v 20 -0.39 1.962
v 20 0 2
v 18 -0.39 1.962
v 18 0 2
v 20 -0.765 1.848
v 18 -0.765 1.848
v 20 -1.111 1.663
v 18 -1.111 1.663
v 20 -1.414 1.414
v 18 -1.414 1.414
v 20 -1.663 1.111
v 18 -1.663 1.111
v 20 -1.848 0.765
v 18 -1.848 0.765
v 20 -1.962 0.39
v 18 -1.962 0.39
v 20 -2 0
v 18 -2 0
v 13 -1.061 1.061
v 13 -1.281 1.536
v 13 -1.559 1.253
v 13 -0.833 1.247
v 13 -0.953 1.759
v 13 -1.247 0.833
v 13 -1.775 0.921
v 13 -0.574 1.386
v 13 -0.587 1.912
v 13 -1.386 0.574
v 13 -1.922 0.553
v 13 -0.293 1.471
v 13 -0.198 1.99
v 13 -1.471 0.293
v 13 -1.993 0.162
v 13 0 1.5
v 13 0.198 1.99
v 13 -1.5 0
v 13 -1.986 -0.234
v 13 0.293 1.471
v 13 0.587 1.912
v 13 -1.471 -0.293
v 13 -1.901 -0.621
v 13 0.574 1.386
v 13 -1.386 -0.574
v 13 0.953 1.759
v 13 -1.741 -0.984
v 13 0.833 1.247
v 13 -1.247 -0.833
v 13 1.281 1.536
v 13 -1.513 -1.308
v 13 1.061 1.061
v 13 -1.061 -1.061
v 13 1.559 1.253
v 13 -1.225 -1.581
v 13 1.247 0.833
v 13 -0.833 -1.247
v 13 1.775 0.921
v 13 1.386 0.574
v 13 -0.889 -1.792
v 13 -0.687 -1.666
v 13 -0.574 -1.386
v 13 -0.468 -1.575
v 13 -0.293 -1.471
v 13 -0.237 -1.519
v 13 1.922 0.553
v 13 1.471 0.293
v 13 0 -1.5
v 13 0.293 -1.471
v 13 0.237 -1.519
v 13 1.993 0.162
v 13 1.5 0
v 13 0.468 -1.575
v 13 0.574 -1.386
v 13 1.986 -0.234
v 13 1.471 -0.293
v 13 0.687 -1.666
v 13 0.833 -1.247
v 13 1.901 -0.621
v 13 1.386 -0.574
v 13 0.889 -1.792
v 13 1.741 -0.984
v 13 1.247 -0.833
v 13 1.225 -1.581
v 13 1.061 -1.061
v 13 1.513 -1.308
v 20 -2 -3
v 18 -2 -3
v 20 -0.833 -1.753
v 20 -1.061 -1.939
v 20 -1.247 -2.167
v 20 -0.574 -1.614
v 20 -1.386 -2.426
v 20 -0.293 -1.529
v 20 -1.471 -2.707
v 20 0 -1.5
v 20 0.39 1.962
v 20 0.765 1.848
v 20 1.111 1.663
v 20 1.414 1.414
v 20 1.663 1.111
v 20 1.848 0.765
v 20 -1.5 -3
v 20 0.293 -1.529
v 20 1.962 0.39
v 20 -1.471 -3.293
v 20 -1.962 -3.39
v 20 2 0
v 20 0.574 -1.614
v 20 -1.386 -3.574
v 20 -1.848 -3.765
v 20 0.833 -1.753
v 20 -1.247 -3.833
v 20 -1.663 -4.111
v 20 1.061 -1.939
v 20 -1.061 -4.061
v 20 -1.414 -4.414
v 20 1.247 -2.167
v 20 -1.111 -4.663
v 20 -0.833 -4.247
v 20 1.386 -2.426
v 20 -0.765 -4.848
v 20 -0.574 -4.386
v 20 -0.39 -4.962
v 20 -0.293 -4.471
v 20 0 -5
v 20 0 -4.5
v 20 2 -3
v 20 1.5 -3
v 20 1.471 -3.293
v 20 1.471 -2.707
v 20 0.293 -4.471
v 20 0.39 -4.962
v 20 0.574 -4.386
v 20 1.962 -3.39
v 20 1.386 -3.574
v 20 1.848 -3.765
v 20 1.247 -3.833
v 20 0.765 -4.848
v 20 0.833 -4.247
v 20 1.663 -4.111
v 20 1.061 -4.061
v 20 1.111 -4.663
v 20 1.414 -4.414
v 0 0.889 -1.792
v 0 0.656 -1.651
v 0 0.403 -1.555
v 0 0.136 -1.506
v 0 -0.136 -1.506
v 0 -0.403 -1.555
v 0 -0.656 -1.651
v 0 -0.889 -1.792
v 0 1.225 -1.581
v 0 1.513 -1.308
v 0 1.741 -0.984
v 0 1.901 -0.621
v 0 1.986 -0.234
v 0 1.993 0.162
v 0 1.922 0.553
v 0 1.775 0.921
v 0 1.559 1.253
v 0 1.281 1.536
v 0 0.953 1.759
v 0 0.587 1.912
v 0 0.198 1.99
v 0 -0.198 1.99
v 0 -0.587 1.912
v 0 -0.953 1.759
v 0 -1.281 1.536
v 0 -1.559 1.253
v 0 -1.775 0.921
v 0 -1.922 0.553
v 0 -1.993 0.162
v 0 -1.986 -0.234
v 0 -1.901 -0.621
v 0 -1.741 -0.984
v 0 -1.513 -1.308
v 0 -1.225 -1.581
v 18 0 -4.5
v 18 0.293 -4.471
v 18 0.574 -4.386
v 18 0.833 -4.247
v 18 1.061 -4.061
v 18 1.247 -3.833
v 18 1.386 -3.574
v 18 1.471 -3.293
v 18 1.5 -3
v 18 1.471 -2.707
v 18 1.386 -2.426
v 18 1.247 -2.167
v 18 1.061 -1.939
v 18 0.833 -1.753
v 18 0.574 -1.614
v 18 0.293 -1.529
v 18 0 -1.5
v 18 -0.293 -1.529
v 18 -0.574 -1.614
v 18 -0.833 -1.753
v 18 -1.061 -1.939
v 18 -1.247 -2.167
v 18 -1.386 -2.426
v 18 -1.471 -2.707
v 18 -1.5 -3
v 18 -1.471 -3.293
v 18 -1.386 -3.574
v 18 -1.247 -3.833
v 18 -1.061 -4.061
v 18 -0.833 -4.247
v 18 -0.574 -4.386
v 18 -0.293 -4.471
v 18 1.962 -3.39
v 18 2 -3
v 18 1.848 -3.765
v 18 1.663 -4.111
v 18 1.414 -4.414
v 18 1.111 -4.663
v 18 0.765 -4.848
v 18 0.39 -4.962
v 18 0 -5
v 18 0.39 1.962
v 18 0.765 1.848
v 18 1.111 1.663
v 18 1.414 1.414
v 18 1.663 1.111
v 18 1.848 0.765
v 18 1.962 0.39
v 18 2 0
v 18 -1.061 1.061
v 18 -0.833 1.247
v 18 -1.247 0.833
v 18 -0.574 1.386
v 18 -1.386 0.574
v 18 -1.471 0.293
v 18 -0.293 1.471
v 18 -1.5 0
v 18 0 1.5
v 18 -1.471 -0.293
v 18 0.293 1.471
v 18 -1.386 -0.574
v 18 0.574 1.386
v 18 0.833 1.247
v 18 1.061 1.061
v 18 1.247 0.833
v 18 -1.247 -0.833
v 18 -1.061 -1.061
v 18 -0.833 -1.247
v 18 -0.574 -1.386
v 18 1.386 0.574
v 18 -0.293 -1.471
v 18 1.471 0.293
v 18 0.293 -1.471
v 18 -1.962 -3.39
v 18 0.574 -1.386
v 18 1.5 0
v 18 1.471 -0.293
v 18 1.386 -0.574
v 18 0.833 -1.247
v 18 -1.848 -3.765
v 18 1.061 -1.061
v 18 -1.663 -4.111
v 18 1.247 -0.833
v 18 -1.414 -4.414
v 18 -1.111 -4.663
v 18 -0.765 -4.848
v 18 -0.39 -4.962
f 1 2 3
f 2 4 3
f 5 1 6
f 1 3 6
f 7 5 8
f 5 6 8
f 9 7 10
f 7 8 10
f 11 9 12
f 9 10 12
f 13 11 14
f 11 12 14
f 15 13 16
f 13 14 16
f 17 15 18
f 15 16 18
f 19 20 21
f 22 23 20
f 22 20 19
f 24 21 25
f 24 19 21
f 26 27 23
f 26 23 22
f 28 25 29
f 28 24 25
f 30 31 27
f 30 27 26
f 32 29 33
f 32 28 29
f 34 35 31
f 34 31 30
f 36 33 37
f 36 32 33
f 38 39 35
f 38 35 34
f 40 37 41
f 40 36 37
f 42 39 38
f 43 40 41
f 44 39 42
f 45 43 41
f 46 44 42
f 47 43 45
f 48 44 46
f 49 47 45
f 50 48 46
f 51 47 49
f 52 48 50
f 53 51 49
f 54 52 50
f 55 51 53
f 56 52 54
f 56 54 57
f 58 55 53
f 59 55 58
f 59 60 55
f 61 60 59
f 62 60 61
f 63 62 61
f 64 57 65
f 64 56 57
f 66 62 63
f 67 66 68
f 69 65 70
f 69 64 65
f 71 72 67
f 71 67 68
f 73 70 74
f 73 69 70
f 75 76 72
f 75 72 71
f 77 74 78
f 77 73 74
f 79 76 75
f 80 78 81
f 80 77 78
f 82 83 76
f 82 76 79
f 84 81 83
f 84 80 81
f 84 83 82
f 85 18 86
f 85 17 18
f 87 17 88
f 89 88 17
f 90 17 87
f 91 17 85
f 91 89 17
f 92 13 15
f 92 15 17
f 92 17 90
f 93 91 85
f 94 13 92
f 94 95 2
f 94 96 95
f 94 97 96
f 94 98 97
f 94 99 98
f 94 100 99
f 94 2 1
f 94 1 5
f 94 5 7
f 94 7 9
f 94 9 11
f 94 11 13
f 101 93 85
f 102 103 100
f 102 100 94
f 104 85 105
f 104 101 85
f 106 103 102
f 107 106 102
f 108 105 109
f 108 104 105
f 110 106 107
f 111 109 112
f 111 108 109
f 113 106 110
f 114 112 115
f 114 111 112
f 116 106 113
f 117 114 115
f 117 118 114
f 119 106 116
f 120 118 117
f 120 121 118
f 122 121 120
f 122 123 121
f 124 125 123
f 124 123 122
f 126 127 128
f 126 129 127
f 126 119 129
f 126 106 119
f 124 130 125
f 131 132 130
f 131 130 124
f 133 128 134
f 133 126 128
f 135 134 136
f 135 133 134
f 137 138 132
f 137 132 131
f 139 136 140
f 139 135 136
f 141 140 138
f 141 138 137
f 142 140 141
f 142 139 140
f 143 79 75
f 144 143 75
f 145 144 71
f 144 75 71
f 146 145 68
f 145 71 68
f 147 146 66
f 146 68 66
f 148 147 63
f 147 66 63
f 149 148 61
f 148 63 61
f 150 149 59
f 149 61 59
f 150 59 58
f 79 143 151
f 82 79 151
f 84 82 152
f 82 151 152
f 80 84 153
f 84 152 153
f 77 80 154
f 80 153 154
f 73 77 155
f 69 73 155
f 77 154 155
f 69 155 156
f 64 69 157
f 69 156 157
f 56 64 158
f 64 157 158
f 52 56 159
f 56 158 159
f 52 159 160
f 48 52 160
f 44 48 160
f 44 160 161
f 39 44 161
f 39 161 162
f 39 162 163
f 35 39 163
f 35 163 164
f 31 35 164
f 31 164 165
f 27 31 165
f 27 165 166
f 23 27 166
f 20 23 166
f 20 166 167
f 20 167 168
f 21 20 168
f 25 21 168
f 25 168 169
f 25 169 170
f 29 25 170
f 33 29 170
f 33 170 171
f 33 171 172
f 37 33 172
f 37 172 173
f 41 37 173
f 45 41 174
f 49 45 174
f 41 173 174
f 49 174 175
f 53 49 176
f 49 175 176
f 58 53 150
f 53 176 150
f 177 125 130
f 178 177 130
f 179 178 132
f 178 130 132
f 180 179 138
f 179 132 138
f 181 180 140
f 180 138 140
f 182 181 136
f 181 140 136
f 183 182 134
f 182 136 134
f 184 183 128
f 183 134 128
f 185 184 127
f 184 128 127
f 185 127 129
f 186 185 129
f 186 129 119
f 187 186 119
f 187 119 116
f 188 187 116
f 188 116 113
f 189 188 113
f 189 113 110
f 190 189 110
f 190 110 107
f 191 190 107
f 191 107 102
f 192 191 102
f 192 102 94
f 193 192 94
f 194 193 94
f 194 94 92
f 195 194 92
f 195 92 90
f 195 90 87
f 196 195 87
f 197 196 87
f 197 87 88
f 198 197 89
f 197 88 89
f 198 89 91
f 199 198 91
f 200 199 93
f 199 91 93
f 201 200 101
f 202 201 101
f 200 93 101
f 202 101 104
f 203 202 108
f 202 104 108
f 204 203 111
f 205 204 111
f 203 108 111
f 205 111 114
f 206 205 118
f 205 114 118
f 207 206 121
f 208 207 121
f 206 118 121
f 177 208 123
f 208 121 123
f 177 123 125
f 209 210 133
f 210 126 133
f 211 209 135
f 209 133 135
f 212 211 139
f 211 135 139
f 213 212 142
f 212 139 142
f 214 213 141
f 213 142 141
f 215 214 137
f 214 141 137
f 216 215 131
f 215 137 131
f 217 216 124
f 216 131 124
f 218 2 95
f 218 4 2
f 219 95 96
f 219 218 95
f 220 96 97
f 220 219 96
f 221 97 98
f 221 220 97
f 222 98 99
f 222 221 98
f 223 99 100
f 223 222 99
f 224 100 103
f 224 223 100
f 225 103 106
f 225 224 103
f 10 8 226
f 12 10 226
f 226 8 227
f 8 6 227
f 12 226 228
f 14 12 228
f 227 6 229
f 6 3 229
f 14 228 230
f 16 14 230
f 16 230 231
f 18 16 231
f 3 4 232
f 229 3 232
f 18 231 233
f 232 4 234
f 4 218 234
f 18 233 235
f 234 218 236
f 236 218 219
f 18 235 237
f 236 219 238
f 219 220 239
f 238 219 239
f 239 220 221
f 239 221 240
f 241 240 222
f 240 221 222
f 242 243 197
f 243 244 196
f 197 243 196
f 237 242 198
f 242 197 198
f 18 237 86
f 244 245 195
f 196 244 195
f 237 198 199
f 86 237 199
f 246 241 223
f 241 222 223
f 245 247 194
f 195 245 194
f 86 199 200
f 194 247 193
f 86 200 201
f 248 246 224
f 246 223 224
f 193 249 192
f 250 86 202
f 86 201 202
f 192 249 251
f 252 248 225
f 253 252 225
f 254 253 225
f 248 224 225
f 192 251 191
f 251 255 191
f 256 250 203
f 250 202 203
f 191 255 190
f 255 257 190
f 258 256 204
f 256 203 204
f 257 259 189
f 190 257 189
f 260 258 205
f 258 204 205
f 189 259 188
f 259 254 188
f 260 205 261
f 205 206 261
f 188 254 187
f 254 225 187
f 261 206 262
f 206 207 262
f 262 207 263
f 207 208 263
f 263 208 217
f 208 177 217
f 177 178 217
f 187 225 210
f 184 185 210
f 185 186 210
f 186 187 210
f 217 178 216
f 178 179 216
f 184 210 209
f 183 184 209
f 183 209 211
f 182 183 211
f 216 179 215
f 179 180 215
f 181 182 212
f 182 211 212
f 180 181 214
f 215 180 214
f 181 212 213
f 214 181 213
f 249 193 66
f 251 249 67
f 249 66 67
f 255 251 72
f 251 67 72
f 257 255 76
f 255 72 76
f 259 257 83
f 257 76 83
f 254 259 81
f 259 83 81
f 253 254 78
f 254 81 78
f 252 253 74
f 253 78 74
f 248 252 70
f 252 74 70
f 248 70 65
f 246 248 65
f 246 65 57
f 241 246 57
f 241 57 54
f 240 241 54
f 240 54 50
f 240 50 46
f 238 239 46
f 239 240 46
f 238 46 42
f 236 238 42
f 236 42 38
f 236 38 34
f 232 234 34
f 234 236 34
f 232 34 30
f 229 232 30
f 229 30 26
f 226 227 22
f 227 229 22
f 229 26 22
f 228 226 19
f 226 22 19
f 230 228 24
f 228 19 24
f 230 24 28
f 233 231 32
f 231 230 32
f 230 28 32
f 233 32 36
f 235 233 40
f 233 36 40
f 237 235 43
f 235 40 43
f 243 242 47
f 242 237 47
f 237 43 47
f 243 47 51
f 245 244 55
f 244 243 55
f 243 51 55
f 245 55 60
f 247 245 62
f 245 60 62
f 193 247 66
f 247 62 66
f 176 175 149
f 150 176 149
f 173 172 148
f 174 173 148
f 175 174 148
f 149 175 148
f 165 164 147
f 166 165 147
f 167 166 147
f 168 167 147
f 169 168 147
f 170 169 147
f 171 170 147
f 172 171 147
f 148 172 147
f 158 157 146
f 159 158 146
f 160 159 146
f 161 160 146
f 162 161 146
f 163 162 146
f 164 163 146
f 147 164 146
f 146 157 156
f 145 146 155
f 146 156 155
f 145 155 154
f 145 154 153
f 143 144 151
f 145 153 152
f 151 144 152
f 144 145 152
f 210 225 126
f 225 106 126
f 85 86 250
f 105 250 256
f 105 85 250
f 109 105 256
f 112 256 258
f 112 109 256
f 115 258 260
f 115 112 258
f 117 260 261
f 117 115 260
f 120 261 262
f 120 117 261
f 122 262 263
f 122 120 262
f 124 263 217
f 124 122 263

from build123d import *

# Parameters (mm, degrees)
SKETCH2_R           = 2
BOSS_EXTRUDE1_DEPTH = 13
SKETCH3_R           = 1.5
BOSS_EXTRUDE2_DEPTH = 7
SKETCH4_W           = 3.988125856
SKETCH4_H           = 4
BOSS_EXTRUDE3_DEPTH = 2
SKETCH5_W           = 2
SKETCH5_H           = 4
BOSS_EXTRUDE4_DEPTH = 7
FILLET1_R           = 2
FILLET2_R           = 2
FILLET3_R           = 2
SKETCH6_R           = 1.5
CUT_EXTRUDE1_DEPTH  = 21.712315177


with BuildPart() as part:
    # Sketch2 → Boss-Extrude1 (new body)
    with BuildSketch(Plane(origin=(0, 0, 0), x_dir=(0, 0, -1), z_dir=(1, 0, 0))):
        Circle(SKETCH2_R)
    extrude(amount=BOSS_EXTRUDE1_DEPTH)

    # Sketch3 → Boss-Extrude2 (add)
    with BuildSketch(Plane(origin=(13, 0, 0), x_dir=(0, 0, -1), z_dir=(1, 0, 0))):
        Circle(SKETCH3_R)
    extrude(amount=BOSS_EXTRUDE2_DEPTH)

    # Sketch4 → Boss-Extrude3 (add)
    with BuildSketch(Plane(origin=(20, 0, 0), x_dir=(0, 0, -1), z_dir=(1, 0, 0))):
        with Locations((-0.005937072, 0)):
            Rectangle(SKETCH4_W, SKETCH4_H)
    extrude(amount=-BOSS_EXTRUDE3_DEPTH)

    # Sketch5 → Boss-Extrude4 (add)
    with BuildSketch(Plane.XY.offset(2)):
        with Locations((19, 0)):
            Rectangle(SKETCH5_W, SKETCH5_H)
    extrude(amount=-BOSS_EXTRUDE4_DEPTH)

    # Fillet1
    fillet1_edges = [part.edges().sort_by_distance(p)[0] for p in [
        (19, 2, 2),
    ]]
    fillet(fillet1_edges, radius=FILLET1_R)

    # Fillet2
    fillet2_edges = [part.edges().sort_by_distance(p)[0] for p in [
        (19, -2, 2),
    ]]
    fillet(fillet2_edges, radius=FILLET2_R - 0.0001)  # a hair under: the kernel refuses the full size

    # Fillet3
    fillet3_edges = [part.edges().sort_by_distance(p)[0] for p in [
        (19, -2, -5),
        (19, 2, -5),
    ]]
    fillet(fillet3_edges, radius=FILLET3_R - 0.0001)  # a hair under: the kernel refuses the full size

    # Sketch6 → Cut-Extrude1 (cut, through all)
    with BuildSketch(Plane(origin=(20, 0, 0), x_dir=(0, 0, -1), z_dir=(1, 0, 0))):
        with Locations((3, 0)):
            Circle(SKETCH6_R)
    extrude(amount=-CUT_EXTRUDE1_DEPTH, mode=Mode.SUBTRACT)


solid = part.part
